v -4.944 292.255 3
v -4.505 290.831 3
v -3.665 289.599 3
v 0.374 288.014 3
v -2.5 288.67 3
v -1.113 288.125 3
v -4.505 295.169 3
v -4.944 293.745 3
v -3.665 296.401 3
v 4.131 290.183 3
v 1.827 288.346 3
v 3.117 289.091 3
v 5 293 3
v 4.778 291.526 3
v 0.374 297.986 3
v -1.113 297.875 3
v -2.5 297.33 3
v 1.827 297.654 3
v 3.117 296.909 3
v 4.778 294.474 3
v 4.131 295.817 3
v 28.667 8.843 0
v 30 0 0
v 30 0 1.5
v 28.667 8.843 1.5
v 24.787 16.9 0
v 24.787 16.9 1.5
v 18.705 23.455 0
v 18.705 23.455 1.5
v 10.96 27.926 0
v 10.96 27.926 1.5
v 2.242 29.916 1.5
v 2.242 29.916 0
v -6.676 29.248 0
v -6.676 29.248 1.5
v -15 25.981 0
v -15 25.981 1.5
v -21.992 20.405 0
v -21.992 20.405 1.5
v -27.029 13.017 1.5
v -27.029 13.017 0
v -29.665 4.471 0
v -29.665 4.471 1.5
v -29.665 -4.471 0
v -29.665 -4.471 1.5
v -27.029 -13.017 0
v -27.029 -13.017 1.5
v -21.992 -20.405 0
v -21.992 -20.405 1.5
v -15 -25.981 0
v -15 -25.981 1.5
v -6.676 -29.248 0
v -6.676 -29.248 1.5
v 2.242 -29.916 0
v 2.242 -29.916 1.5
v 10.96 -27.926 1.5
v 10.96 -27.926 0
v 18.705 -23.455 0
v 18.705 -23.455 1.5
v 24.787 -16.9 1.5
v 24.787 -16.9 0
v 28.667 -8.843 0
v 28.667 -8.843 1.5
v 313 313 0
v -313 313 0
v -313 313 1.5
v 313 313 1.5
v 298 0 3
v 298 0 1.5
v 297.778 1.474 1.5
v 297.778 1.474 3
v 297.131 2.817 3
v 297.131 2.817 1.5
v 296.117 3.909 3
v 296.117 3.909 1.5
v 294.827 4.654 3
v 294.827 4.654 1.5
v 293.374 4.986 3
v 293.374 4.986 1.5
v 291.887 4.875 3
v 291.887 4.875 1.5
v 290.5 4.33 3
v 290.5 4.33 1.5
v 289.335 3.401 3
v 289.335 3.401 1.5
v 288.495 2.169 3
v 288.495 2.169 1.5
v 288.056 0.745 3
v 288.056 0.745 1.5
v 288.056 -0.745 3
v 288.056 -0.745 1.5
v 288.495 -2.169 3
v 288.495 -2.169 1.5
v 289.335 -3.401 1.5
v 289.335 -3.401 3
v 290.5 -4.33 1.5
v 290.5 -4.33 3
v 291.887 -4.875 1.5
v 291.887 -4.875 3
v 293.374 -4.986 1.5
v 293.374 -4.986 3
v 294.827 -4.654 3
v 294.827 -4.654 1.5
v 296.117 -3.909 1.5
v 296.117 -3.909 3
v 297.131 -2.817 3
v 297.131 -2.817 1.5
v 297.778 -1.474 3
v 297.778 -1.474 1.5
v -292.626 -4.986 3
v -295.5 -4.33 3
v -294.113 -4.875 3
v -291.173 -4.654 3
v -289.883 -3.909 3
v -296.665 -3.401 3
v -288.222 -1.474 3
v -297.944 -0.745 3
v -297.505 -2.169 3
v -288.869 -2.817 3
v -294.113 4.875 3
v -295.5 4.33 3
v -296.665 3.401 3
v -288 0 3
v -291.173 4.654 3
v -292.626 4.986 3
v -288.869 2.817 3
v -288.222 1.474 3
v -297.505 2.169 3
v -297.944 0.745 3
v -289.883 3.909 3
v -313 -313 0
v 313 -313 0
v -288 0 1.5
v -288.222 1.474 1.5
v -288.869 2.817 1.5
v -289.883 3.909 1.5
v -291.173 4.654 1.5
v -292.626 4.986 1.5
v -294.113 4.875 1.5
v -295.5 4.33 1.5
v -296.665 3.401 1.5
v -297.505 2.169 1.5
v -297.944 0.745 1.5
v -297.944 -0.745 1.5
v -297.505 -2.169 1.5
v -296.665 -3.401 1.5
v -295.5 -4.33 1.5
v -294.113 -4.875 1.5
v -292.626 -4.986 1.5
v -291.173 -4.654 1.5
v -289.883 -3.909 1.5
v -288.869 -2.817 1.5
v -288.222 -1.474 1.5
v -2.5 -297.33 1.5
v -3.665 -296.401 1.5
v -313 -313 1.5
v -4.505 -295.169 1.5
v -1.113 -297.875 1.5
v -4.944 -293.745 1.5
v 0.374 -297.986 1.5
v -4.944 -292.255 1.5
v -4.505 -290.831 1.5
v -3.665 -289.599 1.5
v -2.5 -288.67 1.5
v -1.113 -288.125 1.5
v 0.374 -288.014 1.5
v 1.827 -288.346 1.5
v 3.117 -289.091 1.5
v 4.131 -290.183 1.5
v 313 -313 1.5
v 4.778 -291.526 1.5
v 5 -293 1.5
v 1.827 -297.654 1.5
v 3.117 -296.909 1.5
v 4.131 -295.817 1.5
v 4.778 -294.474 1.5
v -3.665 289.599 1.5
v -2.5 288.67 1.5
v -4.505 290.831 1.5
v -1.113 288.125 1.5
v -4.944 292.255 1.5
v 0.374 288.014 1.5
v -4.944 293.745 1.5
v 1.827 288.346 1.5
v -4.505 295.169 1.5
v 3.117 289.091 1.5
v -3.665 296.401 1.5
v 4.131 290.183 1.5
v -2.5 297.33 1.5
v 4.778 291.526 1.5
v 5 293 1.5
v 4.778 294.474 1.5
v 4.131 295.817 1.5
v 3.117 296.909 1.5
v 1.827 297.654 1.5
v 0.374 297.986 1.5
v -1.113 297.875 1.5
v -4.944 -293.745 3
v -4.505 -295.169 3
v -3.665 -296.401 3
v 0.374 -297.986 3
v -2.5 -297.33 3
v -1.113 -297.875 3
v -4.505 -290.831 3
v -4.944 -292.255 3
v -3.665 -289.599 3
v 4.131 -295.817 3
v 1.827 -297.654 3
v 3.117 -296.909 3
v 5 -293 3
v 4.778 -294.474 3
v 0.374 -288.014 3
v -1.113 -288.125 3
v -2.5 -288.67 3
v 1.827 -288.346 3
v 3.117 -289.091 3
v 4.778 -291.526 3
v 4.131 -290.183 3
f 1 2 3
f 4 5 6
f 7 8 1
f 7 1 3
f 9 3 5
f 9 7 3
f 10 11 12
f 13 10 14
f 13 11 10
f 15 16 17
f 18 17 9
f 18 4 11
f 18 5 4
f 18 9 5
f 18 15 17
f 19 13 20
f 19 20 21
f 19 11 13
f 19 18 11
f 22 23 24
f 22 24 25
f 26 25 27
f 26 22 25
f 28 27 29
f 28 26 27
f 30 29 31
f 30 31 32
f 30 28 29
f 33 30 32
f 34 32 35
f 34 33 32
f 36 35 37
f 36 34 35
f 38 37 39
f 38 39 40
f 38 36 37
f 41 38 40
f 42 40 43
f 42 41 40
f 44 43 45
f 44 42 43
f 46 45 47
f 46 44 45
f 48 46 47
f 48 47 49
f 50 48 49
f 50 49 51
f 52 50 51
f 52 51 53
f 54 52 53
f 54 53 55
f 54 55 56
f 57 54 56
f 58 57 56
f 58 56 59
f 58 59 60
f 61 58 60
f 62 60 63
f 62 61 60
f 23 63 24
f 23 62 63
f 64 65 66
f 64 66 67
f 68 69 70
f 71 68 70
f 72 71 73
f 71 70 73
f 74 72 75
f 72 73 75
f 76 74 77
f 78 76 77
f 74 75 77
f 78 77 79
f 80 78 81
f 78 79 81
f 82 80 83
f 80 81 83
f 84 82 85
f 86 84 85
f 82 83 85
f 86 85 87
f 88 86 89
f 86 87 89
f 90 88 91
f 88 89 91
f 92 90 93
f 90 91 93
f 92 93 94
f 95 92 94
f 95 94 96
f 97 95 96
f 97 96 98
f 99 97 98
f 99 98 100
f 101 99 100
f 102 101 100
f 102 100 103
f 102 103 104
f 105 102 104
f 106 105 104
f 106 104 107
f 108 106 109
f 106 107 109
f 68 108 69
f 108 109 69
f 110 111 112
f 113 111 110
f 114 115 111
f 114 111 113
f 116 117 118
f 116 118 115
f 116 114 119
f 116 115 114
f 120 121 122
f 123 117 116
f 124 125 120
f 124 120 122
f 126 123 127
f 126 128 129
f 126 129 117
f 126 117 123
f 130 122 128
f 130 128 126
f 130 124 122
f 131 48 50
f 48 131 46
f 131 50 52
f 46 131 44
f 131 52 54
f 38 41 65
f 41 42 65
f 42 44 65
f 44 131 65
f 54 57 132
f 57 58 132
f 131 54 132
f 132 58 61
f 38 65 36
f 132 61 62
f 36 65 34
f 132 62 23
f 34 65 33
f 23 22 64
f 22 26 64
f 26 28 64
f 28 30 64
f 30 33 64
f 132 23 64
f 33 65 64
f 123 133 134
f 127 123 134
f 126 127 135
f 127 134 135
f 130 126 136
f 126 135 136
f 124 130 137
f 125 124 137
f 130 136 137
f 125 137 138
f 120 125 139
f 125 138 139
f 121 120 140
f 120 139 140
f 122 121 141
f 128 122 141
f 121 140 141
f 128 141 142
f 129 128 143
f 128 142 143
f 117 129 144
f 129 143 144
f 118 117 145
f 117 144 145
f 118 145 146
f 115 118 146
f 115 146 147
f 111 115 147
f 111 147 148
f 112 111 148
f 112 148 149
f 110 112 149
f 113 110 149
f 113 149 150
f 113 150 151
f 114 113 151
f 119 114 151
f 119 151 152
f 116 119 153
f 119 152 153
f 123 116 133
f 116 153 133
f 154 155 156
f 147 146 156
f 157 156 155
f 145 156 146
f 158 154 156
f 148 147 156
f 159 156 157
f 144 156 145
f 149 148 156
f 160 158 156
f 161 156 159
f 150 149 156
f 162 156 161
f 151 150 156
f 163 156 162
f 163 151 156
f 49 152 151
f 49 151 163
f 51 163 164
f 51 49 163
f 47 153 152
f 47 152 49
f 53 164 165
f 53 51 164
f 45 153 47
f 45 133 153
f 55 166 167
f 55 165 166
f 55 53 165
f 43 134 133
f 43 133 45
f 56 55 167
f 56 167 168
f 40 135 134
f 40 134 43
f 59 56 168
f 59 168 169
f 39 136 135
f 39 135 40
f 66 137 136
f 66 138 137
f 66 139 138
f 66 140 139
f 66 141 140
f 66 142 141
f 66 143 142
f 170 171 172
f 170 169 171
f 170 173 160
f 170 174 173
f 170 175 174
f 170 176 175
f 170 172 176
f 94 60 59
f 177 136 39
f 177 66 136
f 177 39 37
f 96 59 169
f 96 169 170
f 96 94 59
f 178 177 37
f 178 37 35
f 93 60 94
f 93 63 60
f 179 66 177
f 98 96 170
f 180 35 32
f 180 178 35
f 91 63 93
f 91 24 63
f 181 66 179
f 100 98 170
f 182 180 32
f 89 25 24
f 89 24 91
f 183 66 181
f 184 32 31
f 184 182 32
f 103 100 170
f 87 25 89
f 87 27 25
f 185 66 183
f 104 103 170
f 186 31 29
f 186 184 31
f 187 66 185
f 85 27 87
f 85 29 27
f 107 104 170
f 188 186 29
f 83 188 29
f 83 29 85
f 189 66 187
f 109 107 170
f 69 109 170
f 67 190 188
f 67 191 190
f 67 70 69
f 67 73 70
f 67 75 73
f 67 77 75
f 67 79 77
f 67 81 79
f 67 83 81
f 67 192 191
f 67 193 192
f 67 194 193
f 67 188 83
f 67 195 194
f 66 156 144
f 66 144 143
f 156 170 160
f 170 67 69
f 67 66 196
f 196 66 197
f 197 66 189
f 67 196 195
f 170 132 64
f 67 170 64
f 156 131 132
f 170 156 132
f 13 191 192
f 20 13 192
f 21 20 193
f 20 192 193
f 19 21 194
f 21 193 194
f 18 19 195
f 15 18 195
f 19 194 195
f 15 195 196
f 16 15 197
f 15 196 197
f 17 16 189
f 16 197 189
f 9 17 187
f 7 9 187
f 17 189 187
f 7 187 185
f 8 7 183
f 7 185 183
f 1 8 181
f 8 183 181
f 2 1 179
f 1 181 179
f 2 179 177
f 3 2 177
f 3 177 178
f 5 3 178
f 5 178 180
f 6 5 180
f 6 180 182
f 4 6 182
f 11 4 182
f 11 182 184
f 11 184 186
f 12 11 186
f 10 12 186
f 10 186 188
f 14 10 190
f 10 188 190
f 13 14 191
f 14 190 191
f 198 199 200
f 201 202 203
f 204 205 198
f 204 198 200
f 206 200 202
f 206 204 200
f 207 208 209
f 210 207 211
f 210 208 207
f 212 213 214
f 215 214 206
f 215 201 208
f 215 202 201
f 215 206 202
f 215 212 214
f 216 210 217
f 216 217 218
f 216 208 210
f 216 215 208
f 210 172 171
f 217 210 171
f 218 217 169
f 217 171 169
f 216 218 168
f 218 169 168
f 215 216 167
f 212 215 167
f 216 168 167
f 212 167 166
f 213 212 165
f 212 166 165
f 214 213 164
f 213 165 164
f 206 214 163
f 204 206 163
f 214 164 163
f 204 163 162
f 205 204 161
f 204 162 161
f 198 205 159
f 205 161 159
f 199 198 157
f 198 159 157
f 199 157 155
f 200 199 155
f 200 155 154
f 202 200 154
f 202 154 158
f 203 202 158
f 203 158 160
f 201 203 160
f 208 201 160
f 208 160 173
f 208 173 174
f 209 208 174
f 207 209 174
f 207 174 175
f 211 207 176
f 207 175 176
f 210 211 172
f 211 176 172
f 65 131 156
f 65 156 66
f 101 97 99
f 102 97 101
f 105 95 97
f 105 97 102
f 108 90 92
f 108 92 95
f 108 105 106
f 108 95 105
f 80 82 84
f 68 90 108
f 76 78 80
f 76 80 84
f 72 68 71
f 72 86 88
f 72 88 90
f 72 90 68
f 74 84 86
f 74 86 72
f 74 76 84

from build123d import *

# Parameters (mm, degrees)
SKETCH2_W           = 626
SKETCH2_H           = 626
SKETCH2_R           = 30
BOSS_EXTRUDE1_DEPTH = 1.5
SKETCH3_R           = 5
BOSS_EXTRUDE2_DEPTH = 1.5


with BuildPart() as part:
    # Sketch2 → Boss-Extrude1 (new body)
    with BuildSketch(Plane.XY):
        Rectangle(SKETCH2_W, SKETCH2_H)
        Circle(SKETCH2_R, mode=Mode.SUBTRACT)
    extrude(amount=BOSS_EXTRUDE1_DEPTH)

    # Sketch3 → Boss-Extrude2 (add)
    with BuildSketch(Plane.XY.offset(1.5)):
        with Locations((0, 293)):
            Circle(SKETCH3_R)
        with Locations((-293, 0)):
            Circle(SKETCH3_R)
        with Locations((0, -293)):
            Circle(SKETCH3_R)
        with Locations((293, 0)):
            Circle(SKETCH3_R)
    extrude(amount=BOSS_EXTRUDE2_DEPTH)


solid = part.part
